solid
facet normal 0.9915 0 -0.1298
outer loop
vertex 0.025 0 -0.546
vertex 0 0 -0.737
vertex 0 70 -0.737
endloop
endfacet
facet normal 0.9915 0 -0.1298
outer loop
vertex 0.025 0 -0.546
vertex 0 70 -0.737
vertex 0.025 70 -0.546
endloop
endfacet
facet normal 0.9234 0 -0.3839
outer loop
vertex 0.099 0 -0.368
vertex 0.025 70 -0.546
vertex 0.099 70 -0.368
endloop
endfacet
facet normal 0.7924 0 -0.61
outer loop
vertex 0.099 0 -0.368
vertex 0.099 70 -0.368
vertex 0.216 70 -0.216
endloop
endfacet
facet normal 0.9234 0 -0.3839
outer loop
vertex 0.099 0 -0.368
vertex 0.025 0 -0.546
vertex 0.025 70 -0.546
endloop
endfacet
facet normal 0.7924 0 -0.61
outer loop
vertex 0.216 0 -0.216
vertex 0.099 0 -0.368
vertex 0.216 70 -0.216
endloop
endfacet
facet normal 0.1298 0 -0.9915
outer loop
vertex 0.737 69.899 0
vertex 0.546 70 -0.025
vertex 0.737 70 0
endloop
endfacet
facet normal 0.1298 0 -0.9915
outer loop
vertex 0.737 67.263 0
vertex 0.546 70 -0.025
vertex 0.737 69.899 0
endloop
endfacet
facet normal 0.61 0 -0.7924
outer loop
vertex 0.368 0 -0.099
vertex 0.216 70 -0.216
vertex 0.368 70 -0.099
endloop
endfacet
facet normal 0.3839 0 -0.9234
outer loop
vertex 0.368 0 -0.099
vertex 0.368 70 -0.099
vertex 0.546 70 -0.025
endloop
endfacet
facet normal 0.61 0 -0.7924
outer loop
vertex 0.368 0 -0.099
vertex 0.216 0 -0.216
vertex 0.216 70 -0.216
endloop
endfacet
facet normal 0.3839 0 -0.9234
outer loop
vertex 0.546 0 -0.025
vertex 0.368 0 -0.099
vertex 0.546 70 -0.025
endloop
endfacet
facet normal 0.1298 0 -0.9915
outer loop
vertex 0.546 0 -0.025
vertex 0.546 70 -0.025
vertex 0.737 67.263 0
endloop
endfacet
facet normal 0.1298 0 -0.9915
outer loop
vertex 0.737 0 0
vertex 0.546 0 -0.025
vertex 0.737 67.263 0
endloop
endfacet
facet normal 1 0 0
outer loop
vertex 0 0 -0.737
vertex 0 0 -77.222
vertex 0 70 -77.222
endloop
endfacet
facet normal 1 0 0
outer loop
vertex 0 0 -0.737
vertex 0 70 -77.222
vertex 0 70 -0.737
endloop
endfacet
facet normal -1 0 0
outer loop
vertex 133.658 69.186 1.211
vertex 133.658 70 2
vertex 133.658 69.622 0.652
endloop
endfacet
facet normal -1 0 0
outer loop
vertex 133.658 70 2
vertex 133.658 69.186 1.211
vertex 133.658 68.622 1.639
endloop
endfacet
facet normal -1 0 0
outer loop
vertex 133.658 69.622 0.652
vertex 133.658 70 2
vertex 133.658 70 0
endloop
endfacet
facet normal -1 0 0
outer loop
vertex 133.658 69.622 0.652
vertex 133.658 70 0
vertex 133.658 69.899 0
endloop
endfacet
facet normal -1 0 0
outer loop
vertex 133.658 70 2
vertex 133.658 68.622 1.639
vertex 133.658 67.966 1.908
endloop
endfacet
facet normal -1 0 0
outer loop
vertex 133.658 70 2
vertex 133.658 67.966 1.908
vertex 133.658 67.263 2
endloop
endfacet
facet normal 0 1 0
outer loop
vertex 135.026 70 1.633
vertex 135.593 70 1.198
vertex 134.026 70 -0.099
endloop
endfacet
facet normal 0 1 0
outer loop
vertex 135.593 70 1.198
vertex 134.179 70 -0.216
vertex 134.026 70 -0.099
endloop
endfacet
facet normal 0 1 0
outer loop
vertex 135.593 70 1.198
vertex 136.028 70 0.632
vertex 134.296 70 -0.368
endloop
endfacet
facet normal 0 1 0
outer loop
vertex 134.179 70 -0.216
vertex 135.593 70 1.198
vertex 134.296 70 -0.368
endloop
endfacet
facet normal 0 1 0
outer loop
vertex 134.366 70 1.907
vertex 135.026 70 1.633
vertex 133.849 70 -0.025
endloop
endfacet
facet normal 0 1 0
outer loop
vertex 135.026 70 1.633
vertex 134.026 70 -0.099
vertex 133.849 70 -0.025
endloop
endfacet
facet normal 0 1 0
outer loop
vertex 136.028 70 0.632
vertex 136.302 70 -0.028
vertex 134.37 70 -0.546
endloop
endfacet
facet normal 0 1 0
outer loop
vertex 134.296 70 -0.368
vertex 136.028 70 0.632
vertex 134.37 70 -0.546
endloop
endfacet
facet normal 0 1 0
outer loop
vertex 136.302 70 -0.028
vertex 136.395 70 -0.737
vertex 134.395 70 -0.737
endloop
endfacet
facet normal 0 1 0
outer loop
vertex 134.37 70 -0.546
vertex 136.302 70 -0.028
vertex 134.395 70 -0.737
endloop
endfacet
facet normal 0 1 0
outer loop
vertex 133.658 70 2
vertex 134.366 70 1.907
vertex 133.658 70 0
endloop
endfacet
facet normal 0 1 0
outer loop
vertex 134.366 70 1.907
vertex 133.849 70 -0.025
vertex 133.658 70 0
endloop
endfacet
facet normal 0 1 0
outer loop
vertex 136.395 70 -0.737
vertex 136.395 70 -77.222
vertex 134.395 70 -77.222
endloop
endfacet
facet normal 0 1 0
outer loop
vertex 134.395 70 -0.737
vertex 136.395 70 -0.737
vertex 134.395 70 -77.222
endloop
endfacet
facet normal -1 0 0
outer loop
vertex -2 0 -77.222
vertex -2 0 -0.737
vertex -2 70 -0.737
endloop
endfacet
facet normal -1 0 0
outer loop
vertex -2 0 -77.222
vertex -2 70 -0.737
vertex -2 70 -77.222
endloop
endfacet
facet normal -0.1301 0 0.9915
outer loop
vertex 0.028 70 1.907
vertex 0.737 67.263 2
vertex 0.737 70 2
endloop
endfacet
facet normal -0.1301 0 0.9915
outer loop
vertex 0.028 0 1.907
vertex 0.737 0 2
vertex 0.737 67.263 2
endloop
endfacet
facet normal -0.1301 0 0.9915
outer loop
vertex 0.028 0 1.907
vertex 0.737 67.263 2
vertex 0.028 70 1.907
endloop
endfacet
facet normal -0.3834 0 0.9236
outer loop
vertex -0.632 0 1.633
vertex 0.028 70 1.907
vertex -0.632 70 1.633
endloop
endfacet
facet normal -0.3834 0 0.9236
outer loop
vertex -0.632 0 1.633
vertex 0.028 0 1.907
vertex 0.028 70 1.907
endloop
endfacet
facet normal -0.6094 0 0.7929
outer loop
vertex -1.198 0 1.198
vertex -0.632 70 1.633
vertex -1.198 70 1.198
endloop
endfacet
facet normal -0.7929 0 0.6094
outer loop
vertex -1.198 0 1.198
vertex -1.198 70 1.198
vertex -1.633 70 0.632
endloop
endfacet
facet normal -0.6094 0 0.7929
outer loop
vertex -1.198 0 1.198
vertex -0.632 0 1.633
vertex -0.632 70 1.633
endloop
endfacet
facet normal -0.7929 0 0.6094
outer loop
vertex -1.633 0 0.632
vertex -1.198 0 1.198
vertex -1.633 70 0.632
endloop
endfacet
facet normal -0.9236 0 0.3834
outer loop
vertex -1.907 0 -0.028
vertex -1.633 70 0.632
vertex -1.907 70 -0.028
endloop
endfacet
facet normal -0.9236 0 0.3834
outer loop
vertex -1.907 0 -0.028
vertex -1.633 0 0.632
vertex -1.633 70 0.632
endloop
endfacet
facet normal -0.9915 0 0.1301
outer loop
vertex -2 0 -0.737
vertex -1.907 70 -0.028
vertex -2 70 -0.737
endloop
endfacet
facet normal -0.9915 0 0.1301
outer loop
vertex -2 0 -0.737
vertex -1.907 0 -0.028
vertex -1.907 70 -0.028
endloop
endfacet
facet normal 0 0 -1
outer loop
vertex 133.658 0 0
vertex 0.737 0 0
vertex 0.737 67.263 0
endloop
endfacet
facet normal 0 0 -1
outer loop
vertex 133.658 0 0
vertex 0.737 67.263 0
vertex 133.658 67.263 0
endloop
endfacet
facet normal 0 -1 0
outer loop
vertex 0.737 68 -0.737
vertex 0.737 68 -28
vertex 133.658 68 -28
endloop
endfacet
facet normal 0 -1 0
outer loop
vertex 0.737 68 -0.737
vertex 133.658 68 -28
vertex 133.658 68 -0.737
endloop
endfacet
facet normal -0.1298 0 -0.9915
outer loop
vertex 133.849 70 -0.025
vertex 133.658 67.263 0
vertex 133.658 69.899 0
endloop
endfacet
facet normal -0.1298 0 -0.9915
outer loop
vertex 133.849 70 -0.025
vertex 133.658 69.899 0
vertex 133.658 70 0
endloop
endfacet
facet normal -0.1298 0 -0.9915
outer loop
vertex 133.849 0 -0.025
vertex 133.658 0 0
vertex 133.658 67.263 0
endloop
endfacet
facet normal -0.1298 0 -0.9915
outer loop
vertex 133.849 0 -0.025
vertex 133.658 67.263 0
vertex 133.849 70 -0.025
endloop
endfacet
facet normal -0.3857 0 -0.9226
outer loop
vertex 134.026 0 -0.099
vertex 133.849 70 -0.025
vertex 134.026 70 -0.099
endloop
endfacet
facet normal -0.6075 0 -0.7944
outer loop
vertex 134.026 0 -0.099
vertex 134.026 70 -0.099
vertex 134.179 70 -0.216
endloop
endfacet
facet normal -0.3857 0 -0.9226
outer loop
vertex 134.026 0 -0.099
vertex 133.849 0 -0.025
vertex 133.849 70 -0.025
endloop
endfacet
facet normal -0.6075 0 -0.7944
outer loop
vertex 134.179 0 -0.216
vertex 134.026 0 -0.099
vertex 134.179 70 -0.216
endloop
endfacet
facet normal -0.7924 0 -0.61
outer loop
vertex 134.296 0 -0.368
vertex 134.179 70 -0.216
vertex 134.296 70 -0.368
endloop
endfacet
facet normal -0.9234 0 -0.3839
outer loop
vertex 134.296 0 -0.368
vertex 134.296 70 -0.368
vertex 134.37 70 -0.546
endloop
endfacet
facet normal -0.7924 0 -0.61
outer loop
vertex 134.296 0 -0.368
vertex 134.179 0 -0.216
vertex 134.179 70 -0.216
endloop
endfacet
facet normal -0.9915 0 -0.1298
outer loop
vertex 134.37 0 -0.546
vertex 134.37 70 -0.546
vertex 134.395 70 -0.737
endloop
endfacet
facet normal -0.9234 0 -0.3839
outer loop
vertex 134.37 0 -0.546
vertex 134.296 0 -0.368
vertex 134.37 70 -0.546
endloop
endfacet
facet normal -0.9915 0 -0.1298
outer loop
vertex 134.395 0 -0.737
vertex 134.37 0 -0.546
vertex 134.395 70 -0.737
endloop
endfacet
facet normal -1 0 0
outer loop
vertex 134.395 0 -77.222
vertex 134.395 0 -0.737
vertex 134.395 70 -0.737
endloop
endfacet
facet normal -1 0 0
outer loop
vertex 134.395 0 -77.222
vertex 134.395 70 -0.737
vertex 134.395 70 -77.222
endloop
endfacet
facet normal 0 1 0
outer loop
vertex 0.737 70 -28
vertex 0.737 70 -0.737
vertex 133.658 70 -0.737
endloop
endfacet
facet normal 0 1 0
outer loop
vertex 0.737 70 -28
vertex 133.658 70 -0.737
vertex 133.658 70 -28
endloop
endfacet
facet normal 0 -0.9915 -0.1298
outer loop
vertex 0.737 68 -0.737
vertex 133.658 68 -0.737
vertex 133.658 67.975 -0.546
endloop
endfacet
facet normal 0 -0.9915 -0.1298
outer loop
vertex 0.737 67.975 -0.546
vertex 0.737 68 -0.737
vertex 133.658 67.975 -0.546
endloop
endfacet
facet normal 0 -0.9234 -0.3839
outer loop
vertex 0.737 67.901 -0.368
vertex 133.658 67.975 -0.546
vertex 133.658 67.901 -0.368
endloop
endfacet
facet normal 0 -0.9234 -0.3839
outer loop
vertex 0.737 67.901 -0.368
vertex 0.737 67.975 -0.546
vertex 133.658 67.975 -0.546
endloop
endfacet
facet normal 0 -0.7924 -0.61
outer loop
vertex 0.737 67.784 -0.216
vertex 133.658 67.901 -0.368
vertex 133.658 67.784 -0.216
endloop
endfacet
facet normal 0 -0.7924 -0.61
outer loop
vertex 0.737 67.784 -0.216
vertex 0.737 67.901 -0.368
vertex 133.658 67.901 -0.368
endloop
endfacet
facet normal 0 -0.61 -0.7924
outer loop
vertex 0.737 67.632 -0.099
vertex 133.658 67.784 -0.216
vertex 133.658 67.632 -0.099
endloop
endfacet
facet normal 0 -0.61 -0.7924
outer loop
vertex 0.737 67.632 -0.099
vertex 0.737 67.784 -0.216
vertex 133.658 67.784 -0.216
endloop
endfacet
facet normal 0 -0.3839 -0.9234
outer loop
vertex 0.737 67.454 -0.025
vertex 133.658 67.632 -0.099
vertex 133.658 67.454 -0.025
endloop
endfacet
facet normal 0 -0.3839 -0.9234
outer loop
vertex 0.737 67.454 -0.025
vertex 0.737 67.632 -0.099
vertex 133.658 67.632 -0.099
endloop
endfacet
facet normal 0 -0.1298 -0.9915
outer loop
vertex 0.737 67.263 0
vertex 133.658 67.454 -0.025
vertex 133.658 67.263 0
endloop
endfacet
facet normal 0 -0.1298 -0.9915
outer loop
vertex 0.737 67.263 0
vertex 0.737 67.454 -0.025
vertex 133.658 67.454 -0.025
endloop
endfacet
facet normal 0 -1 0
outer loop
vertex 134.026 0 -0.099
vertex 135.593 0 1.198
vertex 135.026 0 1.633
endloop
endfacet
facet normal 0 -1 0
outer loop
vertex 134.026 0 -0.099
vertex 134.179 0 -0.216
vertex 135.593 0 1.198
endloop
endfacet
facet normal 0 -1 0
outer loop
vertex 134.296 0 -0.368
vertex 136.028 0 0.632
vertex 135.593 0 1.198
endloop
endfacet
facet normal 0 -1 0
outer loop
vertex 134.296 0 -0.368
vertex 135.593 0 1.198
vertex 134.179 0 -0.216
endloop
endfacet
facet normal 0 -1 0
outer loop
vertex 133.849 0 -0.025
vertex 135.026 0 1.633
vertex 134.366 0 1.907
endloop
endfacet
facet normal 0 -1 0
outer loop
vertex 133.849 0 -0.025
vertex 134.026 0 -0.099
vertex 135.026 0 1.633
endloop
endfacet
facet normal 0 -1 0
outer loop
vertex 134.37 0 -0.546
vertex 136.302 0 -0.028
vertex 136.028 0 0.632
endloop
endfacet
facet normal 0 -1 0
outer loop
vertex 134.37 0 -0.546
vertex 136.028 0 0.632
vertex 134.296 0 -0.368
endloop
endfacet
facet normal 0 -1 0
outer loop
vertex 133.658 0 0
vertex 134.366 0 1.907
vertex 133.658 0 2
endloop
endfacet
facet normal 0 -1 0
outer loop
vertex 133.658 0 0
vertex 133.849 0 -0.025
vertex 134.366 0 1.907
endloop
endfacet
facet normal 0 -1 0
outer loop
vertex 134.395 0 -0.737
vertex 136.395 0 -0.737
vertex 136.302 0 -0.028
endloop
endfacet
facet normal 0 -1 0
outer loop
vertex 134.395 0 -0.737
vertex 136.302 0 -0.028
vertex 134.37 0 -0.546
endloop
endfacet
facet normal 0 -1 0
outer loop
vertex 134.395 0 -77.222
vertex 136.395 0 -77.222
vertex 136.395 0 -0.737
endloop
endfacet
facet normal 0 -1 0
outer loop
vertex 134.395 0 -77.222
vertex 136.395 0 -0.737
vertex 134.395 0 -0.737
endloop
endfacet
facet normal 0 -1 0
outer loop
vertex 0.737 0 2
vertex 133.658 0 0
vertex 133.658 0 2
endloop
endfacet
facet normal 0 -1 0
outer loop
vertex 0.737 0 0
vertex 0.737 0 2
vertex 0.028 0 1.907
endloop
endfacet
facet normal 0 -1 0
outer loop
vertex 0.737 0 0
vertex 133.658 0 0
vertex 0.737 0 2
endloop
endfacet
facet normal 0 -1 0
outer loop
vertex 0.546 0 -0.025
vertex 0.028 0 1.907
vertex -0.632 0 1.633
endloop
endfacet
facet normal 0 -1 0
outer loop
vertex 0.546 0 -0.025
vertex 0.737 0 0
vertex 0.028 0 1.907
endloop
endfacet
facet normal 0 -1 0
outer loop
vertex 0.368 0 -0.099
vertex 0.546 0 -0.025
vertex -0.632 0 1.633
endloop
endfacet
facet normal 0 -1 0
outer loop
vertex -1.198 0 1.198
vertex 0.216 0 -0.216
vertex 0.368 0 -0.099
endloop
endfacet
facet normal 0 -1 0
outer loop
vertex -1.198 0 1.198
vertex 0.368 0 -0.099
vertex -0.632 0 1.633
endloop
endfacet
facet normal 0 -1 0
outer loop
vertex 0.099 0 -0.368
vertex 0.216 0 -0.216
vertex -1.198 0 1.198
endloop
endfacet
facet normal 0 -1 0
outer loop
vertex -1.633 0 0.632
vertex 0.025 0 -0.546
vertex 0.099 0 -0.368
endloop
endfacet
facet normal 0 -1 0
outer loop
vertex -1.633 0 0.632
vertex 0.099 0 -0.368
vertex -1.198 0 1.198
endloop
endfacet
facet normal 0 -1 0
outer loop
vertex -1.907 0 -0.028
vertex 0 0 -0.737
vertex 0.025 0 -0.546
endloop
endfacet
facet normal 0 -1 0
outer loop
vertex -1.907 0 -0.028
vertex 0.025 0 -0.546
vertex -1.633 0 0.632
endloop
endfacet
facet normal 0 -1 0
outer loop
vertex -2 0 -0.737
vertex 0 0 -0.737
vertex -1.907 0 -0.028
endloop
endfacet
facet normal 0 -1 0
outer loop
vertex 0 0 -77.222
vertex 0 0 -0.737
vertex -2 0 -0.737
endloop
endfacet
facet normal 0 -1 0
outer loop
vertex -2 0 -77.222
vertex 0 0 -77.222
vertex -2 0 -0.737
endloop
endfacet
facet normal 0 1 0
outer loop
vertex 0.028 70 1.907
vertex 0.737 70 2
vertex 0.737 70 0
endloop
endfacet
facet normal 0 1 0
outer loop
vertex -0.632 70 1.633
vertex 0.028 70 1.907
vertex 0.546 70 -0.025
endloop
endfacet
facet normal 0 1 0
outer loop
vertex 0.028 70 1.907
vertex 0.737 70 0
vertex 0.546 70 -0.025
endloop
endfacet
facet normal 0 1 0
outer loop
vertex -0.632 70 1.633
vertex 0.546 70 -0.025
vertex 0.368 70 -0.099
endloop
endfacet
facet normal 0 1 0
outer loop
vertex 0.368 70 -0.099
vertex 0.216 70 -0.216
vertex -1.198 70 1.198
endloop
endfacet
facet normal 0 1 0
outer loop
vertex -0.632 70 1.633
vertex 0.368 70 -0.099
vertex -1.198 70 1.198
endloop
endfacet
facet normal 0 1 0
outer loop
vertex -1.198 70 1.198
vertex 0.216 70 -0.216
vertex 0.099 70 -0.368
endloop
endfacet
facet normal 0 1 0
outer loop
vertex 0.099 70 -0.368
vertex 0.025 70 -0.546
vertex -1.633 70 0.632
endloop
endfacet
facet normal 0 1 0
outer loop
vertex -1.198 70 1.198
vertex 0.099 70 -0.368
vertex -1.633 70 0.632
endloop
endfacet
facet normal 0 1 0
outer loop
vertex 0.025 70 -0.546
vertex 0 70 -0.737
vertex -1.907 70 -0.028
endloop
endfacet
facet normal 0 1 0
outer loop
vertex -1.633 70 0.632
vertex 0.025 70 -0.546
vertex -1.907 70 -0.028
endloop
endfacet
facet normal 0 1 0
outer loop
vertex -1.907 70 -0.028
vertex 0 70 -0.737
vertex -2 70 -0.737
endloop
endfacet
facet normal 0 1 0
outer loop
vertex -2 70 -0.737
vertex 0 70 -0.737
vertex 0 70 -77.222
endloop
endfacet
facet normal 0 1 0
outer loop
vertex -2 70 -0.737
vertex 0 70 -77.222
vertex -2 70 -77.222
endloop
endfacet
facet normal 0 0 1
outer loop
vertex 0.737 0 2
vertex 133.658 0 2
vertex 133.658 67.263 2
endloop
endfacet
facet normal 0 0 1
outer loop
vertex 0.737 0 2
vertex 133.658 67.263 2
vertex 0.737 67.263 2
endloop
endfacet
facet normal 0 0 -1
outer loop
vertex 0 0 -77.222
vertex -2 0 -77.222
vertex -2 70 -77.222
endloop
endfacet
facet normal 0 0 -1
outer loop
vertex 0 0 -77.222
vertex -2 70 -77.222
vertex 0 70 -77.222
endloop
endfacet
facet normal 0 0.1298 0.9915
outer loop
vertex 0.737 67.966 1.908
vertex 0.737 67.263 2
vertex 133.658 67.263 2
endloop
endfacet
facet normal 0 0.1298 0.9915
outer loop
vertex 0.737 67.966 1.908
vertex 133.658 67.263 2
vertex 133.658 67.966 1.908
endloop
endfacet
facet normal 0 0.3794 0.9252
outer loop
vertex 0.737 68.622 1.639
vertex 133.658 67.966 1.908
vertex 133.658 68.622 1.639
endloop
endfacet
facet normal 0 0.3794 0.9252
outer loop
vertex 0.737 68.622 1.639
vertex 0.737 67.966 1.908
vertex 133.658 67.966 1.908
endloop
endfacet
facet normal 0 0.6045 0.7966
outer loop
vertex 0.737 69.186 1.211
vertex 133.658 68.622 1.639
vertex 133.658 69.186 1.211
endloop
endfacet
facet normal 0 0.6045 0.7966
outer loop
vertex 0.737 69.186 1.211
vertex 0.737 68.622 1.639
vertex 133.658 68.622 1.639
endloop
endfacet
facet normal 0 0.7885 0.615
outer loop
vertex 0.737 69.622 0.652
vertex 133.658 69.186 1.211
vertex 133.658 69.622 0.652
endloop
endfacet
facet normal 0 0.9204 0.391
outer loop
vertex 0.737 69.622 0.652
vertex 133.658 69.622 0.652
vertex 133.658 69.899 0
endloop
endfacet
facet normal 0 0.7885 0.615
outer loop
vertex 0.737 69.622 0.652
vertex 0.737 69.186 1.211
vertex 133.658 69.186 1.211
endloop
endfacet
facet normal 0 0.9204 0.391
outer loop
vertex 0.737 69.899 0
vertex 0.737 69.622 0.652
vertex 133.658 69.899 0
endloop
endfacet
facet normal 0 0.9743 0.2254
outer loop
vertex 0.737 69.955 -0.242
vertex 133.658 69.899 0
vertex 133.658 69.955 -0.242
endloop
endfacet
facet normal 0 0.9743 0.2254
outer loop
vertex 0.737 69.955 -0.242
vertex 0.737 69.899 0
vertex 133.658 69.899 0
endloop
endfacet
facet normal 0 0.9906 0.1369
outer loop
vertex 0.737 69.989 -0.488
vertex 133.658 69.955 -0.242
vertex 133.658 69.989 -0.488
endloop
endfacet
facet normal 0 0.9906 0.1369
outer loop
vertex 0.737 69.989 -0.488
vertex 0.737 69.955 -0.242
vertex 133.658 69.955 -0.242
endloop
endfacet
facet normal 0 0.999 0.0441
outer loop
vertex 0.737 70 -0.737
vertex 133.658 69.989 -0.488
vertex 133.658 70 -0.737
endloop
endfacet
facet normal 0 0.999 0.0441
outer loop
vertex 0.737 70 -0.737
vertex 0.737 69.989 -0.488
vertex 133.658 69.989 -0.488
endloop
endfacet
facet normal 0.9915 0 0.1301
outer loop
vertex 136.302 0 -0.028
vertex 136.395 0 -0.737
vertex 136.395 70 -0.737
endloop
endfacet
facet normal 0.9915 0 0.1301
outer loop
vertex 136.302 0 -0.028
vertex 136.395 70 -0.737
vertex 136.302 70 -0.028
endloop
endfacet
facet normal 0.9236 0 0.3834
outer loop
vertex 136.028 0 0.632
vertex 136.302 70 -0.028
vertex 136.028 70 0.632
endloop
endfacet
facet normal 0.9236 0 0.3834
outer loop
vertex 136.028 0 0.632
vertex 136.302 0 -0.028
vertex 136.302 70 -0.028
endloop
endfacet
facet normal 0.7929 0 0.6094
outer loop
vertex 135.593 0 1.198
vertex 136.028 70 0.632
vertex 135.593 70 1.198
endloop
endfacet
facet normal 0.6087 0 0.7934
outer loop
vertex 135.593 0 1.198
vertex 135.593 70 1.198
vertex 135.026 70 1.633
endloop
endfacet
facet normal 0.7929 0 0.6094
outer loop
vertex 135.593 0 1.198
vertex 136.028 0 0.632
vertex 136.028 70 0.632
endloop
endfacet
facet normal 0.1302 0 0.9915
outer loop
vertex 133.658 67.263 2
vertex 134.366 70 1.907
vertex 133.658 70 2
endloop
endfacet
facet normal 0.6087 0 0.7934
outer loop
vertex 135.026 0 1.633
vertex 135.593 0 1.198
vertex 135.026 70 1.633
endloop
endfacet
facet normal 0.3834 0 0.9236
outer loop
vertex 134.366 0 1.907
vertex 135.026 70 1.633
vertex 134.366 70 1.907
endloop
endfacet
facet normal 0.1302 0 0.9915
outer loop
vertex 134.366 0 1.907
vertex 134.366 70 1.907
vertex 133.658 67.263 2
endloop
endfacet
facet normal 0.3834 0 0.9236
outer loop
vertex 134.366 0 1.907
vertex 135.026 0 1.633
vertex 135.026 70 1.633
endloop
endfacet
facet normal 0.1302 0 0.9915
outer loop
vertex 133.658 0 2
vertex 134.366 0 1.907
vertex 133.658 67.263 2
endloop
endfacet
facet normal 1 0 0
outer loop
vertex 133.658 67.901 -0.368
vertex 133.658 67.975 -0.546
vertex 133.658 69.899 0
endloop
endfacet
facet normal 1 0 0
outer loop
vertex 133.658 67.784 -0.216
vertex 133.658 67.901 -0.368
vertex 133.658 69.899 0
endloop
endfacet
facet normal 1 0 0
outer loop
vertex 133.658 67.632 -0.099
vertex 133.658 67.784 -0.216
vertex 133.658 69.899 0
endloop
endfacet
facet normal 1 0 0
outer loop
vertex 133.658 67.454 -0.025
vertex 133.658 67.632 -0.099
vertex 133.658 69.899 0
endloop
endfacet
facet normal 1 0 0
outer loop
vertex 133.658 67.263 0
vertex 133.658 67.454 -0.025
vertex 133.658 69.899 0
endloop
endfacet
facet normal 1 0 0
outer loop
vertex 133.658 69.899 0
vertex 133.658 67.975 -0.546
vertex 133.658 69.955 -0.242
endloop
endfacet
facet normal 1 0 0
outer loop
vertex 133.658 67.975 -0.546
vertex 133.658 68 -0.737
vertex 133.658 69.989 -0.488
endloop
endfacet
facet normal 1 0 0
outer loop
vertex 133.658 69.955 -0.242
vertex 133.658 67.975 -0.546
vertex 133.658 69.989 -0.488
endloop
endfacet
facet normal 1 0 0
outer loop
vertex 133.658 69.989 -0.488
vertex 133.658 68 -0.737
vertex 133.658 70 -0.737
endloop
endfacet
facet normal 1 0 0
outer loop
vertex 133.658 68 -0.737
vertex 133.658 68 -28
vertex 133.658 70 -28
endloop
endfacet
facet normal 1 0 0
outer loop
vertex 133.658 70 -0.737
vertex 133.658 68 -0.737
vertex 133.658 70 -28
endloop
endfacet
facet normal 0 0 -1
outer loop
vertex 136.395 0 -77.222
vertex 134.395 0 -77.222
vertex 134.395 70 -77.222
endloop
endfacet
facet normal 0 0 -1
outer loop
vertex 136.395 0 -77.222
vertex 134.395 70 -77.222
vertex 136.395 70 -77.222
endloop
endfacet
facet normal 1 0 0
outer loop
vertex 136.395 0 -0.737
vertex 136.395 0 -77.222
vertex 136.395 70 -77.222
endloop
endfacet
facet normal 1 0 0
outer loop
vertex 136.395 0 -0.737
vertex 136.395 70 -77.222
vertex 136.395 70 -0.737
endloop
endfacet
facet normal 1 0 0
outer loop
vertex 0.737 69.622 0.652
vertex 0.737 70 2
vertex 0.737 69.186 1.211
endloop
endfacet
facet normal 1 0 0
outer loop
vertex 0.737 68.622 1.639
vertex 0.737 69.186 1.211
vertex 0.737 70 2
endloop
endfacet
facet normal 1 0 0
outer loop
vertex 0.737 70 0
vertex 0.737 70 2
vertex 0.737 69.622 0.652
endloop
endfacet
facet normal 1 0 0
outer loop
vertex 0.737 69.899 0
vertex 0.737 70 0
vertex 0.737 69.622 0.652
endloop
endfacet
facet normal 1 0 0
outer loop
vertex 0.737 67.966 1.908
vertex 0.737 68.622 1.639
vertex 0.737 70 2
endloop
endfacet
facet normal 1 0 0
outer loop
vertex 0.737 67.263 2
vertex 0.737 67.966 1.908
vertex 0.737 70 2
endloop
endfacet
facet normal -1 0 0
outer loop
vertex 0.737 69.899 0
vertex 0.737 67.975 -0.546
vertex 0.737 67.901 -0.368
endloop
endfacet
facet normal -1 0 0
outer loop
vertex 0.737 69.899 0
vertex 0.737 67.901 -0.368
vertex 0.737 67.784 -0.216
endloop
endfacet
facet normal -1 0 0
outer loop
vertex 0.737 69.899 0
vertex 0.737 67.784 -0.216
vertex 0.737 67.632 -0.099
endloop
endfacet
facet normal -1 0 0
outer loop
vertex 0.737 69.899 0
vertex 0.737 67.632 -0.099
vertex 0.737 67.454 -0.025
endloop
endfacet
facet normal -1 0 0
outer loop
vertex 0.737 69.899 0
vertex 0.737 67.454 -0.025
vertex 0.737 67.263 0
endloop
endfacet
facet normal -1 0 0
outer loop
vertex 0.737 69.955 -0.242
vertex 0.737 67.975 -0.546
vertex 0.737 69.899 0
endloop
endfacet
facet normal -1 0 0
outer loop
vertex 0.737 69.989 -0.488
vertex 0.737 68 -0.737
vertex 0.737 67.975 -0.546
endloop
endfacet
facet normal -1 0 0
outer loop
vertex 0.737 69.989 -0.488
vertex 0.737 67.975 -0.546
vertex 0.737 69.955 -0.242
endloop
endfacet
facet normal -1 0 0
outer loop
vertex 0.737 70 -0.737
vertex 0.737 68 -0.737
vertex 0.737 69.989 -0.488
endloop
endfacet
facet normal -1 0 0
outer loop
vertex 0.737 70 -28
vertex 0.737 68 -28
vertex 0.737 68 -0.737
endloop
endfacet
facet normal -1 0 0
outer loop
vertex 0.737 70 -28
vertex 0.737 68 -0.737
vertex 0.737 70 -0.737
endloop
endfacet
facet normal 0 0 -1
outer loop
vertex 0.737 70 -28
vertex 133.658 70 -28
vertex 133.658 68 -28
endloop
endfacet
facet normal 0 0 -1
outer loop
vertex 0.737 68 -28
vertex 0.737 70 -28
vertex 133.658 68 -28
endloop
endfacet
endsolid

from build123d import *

# Parameters (mm, degrees)
BASE_FLANGE1_DEPTH           = 70
EDGE_FLANGE1_STRIP_W         = 9.4732
EDGE_FLANGE1_STRIP_H         = 2
EDGE_FLANGE1_STRIP_CUT_DEPTH = 132.921562236
EDGE_FLANGE1_DEPTH           = 132.921562236


# Sheet-metal steps are written as plain solids
with BuildPart() as part:
    # Sketch1 → Base-Flange1 (new body)
    with BuildSketch(Plane(origin=(0, 0, 0), x_dir=(1, 0, 0), z_dir=(0, 1, 0))):
        with BuildLine():
            Line((0, 77.222396617), (0, 0.7366))
            ThreePointArc((0, 0.7366), (0.215745145, 0.215745145), (0.7366, 0))
            Line((0.7366, 0), (133.658162236, 0))
            ThreePointArc((133.658162236, 0), (134.179017091, 0.215745145), (134.394762236, 0.7366))
            Line((134.394762236, 0.7366), (134.394762236, 77.222396617))
            Line((134.394762236, 77.222396617), (136.394762236, 77.222396617))
            Line((136.394762236, 77.222396617), (136.394762236, 0.7366))
            ThreePointArc((136.394762236, 0.7366), (135.593230653, -1.198468417), (133.658162236, -2))
            Line((133.658162236, -2), (0.7366, -2))
            ThreePointArc((0.7366, -2), (-1.198468417, -1.198468417), (-2, 0.7366))
            Line((-2, 0.7366), (-2, 77.222396617))
            Line((-2, 77.222396617), (0, 77.222396617))
        make_face()
    extrude(amount=BASE_FLANGE1_DEPTH)

    # Edge-Flange1 strip (across the edge) → Edge-Flange1 strip cut (cut)
    with BuildSketch(Plane(origin=(0.7366, 70, 0), x_dir=(0, -1, 0), z_dir=(1, 0, 0))):
        with Locations((-2, -1)):
            Rectangle(EDGE_FLANGE1_STRIP_W, EDGE_FLANGE1_STRIP_H)
    extrude(amount=EDGE_FLANGE1_STRIP_CUT_DEPTH, mode=Mode.SUBTRACT)

    # Edge-Flange1 section (across the edge) → Edge-Flange1 (add)
    with BuildSketch(Plane(origin=(0.7366, 70, 0), x_dir=(0, -1, 0), z_dir=(1, 0, 0))):
        with BuildLine():
            Line((0, 0.7366), (0, 28))
            Line((0, 28), (2, 28))
            Line((2, 28), (2, 0.7366))
            ThreePointArc((2, 0.7366), (2.215745145, 0.215745145), (2.7366, 0))
            Line((2.7366, 0), (2.7366, -2))
            ThreePointArc((2.7366, -2), (0.801531583, -1.198468417), (0, 0.7366))
        make_face()
    extrude(amount=EDGE_FLANGE1_DEPTH)


solid = part.part
